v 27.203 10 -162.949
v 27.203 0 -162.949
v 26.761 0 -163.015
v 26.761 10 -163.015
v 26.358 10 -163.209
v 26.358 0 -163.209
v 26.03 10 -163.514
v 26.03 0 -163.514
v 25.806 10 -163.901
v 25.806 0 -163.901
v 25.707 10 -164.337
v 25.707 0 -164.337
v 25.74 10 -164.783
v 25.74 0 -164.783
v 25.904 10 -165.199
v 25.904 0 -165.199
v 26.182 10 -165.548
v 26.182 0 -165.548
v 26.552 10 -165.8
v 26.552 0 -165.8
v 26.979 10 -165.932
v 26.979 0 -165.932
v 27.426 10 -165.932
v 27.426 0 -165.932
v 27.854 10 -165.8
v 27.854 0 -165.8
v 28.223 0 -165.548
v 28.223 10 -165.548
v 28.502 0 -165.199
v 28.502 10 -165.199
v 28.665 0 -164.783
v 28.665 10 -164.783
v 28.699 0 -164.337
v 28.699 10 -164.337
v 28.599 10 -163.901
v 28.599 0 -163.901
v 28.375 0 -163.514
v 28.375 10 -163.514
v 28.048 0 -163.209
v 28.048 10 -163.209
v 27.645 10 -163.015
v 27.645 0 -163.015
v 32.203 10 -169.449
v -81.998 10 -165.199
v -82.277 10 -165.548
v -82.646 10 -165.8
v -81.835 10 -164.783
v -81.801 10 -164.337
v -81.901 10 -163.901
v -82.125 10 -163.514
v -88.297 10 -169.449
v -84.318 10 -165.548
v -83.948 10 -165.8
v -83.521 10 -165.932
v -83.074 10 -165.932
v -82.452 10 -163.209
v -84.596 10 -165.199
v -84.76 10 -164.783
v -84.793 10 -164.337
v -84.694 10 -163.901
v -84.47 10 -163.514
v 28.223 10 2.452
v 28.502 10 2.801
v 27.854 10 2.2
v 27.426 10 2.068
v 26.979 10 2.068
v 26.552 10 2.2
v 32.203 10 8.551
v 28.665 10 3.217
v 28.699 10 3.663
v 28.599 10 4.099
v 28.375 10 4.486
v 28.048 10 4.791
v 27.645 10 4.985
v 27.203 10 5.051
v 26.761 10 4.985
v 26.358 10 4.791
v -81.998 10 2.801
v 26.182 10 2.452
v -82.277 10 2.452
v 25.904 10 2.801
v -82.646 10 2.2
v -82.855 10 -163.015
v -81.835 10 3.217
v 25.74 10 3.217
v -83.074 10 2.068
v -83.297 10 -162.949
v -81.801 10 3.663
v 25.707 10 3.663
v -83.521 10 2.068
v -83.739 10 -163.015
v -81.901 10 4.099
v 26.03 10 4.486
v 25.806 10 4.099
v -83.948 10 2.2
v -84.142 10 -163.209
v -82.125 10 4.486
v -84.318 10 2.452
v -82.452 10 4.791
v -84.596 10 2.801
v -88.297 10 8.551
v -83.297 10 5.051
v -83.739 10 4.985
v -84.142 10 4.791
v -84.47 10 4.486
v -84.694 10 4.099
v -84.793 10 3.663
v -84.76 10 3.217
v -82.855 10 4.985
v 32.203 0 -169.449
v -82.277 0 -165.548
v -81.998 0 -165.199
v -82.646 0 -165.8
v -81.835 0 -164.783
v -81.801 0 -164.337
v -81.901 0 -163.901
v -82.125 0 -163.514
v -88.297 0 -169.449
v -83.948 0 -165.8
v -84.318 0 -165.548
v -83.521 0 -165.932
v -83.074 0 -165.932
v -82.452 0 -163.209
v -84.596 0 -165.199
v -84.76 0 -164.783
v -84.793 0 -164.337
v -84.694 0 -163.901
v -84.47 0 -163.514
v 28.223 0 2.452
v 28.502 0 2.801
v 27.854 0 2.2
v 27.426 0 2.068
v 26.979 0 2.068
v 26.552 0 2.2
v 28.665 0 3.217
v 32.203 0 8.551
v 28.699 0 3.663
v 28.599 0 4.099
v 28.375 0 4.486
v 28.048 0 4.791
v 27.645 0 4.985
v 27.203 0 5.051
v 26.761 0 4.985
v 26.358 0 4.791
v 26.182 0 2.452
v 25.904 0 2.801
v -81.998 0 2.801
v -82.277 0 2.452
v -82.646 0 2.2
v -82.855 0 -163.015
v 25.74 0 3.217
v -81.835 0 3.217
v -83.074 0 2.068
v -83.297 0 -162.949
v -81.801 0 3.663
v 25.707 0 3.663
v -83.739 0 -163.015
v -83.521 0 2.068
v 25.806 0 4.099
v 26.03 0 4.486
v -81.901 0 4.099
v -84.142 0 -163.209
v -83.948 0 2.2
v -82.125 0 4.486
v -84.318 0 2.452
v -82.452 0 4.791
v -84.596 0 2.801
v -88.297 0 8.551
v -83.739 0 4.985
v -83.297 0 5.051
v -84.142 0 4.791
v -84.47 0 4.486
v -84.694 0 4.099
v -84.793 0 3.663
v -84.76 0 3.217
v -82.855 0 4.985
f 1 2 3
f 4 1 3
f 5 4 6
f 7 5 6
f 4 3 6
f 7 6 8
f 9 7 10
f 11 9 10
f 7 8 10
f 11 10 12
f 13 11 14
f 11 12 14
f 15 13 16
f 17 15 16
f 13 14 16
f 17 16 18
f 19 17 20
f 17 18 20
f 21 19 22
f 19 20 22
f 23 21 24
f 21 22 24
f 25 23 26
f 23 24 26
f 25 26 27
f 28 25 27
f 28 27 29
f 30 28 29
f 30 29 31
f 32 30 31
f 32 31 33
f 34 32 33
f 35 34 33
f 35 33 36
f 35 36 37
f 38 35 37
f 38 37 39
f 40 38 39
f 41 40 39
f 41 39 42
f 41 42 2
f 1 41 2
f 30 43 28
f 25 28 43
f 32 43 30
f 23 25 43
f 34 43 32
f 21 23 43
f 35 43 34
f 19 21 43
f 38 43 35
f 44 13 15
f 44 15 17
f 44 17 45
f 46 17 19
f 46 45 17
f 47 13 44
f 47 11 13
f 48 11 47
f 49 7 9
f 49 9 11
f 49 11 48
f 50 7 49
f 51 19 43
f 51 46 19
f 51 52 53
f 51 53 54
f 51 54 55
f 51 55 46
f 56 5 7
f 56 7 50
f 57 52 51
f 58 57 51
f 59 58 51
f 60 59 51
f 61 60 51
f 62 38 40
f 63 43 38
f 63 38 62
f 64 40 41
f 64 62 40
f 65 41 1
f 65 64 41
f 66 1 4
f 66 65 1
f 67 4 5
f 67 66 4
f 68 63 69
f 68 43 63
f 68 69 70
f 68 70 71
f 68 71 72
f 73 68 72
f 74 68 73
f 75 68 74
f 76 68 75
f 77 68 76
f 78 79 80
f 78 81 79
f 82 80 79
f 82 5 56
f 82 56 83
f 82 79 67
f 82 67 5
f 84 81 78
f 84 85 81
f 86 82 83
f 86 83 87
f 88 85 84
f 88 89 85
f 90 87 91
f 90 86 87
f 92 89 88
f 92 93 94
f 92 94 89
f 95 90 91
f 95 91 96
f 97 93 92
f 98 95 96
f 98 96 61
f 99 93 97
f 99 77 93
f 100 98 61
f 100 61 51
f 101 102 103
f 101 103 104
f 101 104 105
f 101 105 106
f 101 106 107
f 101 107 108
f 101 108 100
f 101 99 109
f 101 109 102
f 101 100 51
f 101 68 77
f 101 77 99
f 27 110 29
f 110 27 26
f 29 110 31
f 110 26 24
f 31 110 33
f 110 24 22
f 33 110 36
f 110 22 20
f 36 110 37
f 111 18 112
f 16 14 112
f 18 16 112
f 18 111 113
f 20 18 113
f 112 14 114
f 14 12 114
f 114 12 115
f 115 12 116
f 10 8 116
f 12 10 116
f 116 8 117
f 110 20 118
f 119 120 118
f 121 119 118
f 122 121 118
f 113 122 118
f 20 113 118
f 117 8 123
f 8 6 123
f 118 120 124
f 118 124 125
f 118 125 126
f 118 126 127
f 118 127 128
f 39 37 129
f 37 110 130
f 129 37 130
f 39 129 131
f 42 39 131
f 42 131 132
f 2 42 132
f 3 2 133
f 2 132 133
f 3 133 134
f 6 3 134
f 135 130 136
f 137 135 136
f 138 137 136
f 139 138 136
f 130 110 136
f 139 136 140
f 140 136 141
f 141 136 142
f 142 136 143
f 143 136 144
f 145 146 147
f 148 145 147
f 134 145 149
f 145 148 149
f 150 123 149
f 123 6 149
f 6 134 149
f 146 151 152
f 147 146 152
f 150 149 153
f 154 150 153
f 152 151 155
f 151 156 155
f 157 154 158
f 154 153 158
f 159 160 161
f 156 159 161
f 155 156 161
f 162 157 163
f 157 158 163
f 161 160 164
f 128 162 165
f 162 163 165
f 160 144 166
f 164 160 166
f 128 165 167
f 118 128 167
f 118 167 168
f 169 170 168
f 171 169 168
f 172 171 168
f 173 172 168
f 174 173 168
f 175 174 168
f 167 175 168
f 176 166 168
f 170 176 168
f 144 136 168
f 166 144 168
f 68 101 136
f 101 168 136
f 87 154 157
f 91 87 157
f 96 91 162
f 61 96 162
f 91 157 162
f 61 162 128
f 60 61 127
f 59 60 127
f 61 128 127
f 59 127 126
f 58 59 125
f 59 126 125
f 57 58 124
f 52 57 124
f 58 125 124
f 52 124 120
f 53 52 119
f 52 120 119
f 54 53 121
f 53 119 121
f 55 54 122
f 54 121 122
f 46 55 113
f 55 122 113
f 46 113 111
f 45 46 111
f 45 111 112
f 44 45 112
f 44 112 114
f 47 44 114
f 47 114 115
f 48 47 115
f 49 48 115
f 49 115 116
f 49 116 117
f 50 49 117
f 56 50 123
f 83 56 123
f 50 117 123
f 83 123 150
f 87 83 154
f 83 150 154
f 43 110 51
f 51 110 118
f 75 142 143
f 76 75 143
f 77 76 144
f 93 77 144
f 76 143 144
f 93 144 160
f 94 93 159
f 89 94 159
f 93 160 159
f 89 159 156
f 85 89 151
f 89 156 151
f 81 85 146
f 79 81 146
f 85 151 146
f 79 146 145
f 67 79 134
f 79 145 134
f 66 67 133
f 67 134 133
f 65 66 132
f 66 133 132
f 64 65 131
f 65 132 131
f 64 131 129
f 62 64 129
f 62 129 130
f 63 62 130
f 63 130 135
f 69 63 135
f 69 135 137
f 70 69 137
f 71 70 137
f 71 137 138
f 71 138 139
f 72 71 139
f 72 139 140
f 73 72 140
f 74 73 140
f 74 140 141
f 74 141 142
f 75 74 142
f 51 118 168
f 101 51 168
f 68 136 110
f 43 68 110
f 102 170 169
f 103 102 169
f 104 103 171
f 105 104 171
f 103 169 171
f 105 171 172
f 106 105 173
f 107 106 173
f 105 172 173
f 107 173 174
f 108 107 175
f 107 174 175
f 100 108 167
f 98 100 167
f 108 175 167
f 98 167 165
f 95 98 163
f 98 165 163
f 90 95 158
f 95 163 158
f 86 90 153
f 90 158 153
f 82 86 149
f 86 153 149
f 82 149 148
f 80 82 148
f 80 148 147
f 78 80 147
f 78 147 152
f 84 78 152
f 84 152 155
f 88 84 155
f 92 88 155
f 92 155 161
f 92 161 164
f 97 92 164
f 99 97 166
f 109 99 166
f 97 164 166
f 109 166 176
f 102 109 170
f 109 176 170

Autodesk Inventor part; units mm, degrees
ref_plane "YZ Plane" through (0, 0, 0) normal (1, 0, 0) x (0, 1, 0)
ref_plane "XZ Plane" through (0, 0, 0) normal (0, 1, 0) x (-1, 0, 0)
ref_plane "XY Plane" through (0, 0, 0) normal (0, 0, 1) x (1, 0, 0)
sketch "Sketch1" plane through (0, 0, 0) normal (0, 1, 0) x (-1, 0, 0)
  line L0 (88.2973, 8.5512) -> (-32.2027, 8.5512)
  line L1 (-32.2027, 8.5512) -> (-32.2027, -169.4488)
  line L2 (-32.2027, -169.4488) -> (88.2973, -169.4488)
  line L3 (88.2973, -169.4488) -> (88.2973, 8.5512)
  dimension "d1" = 178
  dimension "d2" = 120.5
extrude "Extrusion1" add sketch "Sketch1" along normal blind 10
sketch "Sketch2" plane through (0, 10, 0) normal (0, 1, 0) x (1, 0, 0)
  circle A0 centre (-83.2973, -3.5512) radius 1.5
  line L0 (-88.2973, 169.4488) -> (-88.2973, -8.5512) projected
  line L1 (-88.2973, -8.5512) -> (32.2027, -8.5512) projected
  line L2 (-88.2973, 80.4488) -> (33.9158, 80.4488)
  line L3 (32.2027, 169.4488) -> (-88.2973, 169.4488) projected
  circle A1 centre (-83.2973, 164.4488) radius 1.5
  line L4 (-28.0473, -8.5512) -> (-28.0473, 169.4488)
  line L5 (32.2027, -8.5512) -> (32.2027, 169.4488) projected
  circle A2 centre (27.2027, -3.5512) radius 1.5
  circle A3 centre (27.2027, 164.4488) radius 1.5
  point P0 (0, 0)
  dimension "d5" = 3
  dimension "d6" = 5
  dimension "d7" = 5
  dimension "d8" = 89
  dimension "d9" = 60.25
hole "Hole1" at (-83.2973, 10, 3.5512) at (27.2027, 10, 3.5512) at (-83.2973, 10, -164.4488) at (27.2027, 10, -164.4488) direction (0, -1, 0) diameter 3 end through all
thread "Thread1" size "M3x0.5" class "6H" standard "ANSI Metric M Profile" full length
thread "Thread2" size "M3x0.5" class "6H" standard "ANSI Metric M Profile" full length
thread "Thread3" size "M3x0.5" class "6H" standard "ANSI Metric M Profile" full length
thread "Thread4" size "M3x0.5" class "6H" standard "ANSI Metric M Profile" full length
properties part number "cabin_back"
